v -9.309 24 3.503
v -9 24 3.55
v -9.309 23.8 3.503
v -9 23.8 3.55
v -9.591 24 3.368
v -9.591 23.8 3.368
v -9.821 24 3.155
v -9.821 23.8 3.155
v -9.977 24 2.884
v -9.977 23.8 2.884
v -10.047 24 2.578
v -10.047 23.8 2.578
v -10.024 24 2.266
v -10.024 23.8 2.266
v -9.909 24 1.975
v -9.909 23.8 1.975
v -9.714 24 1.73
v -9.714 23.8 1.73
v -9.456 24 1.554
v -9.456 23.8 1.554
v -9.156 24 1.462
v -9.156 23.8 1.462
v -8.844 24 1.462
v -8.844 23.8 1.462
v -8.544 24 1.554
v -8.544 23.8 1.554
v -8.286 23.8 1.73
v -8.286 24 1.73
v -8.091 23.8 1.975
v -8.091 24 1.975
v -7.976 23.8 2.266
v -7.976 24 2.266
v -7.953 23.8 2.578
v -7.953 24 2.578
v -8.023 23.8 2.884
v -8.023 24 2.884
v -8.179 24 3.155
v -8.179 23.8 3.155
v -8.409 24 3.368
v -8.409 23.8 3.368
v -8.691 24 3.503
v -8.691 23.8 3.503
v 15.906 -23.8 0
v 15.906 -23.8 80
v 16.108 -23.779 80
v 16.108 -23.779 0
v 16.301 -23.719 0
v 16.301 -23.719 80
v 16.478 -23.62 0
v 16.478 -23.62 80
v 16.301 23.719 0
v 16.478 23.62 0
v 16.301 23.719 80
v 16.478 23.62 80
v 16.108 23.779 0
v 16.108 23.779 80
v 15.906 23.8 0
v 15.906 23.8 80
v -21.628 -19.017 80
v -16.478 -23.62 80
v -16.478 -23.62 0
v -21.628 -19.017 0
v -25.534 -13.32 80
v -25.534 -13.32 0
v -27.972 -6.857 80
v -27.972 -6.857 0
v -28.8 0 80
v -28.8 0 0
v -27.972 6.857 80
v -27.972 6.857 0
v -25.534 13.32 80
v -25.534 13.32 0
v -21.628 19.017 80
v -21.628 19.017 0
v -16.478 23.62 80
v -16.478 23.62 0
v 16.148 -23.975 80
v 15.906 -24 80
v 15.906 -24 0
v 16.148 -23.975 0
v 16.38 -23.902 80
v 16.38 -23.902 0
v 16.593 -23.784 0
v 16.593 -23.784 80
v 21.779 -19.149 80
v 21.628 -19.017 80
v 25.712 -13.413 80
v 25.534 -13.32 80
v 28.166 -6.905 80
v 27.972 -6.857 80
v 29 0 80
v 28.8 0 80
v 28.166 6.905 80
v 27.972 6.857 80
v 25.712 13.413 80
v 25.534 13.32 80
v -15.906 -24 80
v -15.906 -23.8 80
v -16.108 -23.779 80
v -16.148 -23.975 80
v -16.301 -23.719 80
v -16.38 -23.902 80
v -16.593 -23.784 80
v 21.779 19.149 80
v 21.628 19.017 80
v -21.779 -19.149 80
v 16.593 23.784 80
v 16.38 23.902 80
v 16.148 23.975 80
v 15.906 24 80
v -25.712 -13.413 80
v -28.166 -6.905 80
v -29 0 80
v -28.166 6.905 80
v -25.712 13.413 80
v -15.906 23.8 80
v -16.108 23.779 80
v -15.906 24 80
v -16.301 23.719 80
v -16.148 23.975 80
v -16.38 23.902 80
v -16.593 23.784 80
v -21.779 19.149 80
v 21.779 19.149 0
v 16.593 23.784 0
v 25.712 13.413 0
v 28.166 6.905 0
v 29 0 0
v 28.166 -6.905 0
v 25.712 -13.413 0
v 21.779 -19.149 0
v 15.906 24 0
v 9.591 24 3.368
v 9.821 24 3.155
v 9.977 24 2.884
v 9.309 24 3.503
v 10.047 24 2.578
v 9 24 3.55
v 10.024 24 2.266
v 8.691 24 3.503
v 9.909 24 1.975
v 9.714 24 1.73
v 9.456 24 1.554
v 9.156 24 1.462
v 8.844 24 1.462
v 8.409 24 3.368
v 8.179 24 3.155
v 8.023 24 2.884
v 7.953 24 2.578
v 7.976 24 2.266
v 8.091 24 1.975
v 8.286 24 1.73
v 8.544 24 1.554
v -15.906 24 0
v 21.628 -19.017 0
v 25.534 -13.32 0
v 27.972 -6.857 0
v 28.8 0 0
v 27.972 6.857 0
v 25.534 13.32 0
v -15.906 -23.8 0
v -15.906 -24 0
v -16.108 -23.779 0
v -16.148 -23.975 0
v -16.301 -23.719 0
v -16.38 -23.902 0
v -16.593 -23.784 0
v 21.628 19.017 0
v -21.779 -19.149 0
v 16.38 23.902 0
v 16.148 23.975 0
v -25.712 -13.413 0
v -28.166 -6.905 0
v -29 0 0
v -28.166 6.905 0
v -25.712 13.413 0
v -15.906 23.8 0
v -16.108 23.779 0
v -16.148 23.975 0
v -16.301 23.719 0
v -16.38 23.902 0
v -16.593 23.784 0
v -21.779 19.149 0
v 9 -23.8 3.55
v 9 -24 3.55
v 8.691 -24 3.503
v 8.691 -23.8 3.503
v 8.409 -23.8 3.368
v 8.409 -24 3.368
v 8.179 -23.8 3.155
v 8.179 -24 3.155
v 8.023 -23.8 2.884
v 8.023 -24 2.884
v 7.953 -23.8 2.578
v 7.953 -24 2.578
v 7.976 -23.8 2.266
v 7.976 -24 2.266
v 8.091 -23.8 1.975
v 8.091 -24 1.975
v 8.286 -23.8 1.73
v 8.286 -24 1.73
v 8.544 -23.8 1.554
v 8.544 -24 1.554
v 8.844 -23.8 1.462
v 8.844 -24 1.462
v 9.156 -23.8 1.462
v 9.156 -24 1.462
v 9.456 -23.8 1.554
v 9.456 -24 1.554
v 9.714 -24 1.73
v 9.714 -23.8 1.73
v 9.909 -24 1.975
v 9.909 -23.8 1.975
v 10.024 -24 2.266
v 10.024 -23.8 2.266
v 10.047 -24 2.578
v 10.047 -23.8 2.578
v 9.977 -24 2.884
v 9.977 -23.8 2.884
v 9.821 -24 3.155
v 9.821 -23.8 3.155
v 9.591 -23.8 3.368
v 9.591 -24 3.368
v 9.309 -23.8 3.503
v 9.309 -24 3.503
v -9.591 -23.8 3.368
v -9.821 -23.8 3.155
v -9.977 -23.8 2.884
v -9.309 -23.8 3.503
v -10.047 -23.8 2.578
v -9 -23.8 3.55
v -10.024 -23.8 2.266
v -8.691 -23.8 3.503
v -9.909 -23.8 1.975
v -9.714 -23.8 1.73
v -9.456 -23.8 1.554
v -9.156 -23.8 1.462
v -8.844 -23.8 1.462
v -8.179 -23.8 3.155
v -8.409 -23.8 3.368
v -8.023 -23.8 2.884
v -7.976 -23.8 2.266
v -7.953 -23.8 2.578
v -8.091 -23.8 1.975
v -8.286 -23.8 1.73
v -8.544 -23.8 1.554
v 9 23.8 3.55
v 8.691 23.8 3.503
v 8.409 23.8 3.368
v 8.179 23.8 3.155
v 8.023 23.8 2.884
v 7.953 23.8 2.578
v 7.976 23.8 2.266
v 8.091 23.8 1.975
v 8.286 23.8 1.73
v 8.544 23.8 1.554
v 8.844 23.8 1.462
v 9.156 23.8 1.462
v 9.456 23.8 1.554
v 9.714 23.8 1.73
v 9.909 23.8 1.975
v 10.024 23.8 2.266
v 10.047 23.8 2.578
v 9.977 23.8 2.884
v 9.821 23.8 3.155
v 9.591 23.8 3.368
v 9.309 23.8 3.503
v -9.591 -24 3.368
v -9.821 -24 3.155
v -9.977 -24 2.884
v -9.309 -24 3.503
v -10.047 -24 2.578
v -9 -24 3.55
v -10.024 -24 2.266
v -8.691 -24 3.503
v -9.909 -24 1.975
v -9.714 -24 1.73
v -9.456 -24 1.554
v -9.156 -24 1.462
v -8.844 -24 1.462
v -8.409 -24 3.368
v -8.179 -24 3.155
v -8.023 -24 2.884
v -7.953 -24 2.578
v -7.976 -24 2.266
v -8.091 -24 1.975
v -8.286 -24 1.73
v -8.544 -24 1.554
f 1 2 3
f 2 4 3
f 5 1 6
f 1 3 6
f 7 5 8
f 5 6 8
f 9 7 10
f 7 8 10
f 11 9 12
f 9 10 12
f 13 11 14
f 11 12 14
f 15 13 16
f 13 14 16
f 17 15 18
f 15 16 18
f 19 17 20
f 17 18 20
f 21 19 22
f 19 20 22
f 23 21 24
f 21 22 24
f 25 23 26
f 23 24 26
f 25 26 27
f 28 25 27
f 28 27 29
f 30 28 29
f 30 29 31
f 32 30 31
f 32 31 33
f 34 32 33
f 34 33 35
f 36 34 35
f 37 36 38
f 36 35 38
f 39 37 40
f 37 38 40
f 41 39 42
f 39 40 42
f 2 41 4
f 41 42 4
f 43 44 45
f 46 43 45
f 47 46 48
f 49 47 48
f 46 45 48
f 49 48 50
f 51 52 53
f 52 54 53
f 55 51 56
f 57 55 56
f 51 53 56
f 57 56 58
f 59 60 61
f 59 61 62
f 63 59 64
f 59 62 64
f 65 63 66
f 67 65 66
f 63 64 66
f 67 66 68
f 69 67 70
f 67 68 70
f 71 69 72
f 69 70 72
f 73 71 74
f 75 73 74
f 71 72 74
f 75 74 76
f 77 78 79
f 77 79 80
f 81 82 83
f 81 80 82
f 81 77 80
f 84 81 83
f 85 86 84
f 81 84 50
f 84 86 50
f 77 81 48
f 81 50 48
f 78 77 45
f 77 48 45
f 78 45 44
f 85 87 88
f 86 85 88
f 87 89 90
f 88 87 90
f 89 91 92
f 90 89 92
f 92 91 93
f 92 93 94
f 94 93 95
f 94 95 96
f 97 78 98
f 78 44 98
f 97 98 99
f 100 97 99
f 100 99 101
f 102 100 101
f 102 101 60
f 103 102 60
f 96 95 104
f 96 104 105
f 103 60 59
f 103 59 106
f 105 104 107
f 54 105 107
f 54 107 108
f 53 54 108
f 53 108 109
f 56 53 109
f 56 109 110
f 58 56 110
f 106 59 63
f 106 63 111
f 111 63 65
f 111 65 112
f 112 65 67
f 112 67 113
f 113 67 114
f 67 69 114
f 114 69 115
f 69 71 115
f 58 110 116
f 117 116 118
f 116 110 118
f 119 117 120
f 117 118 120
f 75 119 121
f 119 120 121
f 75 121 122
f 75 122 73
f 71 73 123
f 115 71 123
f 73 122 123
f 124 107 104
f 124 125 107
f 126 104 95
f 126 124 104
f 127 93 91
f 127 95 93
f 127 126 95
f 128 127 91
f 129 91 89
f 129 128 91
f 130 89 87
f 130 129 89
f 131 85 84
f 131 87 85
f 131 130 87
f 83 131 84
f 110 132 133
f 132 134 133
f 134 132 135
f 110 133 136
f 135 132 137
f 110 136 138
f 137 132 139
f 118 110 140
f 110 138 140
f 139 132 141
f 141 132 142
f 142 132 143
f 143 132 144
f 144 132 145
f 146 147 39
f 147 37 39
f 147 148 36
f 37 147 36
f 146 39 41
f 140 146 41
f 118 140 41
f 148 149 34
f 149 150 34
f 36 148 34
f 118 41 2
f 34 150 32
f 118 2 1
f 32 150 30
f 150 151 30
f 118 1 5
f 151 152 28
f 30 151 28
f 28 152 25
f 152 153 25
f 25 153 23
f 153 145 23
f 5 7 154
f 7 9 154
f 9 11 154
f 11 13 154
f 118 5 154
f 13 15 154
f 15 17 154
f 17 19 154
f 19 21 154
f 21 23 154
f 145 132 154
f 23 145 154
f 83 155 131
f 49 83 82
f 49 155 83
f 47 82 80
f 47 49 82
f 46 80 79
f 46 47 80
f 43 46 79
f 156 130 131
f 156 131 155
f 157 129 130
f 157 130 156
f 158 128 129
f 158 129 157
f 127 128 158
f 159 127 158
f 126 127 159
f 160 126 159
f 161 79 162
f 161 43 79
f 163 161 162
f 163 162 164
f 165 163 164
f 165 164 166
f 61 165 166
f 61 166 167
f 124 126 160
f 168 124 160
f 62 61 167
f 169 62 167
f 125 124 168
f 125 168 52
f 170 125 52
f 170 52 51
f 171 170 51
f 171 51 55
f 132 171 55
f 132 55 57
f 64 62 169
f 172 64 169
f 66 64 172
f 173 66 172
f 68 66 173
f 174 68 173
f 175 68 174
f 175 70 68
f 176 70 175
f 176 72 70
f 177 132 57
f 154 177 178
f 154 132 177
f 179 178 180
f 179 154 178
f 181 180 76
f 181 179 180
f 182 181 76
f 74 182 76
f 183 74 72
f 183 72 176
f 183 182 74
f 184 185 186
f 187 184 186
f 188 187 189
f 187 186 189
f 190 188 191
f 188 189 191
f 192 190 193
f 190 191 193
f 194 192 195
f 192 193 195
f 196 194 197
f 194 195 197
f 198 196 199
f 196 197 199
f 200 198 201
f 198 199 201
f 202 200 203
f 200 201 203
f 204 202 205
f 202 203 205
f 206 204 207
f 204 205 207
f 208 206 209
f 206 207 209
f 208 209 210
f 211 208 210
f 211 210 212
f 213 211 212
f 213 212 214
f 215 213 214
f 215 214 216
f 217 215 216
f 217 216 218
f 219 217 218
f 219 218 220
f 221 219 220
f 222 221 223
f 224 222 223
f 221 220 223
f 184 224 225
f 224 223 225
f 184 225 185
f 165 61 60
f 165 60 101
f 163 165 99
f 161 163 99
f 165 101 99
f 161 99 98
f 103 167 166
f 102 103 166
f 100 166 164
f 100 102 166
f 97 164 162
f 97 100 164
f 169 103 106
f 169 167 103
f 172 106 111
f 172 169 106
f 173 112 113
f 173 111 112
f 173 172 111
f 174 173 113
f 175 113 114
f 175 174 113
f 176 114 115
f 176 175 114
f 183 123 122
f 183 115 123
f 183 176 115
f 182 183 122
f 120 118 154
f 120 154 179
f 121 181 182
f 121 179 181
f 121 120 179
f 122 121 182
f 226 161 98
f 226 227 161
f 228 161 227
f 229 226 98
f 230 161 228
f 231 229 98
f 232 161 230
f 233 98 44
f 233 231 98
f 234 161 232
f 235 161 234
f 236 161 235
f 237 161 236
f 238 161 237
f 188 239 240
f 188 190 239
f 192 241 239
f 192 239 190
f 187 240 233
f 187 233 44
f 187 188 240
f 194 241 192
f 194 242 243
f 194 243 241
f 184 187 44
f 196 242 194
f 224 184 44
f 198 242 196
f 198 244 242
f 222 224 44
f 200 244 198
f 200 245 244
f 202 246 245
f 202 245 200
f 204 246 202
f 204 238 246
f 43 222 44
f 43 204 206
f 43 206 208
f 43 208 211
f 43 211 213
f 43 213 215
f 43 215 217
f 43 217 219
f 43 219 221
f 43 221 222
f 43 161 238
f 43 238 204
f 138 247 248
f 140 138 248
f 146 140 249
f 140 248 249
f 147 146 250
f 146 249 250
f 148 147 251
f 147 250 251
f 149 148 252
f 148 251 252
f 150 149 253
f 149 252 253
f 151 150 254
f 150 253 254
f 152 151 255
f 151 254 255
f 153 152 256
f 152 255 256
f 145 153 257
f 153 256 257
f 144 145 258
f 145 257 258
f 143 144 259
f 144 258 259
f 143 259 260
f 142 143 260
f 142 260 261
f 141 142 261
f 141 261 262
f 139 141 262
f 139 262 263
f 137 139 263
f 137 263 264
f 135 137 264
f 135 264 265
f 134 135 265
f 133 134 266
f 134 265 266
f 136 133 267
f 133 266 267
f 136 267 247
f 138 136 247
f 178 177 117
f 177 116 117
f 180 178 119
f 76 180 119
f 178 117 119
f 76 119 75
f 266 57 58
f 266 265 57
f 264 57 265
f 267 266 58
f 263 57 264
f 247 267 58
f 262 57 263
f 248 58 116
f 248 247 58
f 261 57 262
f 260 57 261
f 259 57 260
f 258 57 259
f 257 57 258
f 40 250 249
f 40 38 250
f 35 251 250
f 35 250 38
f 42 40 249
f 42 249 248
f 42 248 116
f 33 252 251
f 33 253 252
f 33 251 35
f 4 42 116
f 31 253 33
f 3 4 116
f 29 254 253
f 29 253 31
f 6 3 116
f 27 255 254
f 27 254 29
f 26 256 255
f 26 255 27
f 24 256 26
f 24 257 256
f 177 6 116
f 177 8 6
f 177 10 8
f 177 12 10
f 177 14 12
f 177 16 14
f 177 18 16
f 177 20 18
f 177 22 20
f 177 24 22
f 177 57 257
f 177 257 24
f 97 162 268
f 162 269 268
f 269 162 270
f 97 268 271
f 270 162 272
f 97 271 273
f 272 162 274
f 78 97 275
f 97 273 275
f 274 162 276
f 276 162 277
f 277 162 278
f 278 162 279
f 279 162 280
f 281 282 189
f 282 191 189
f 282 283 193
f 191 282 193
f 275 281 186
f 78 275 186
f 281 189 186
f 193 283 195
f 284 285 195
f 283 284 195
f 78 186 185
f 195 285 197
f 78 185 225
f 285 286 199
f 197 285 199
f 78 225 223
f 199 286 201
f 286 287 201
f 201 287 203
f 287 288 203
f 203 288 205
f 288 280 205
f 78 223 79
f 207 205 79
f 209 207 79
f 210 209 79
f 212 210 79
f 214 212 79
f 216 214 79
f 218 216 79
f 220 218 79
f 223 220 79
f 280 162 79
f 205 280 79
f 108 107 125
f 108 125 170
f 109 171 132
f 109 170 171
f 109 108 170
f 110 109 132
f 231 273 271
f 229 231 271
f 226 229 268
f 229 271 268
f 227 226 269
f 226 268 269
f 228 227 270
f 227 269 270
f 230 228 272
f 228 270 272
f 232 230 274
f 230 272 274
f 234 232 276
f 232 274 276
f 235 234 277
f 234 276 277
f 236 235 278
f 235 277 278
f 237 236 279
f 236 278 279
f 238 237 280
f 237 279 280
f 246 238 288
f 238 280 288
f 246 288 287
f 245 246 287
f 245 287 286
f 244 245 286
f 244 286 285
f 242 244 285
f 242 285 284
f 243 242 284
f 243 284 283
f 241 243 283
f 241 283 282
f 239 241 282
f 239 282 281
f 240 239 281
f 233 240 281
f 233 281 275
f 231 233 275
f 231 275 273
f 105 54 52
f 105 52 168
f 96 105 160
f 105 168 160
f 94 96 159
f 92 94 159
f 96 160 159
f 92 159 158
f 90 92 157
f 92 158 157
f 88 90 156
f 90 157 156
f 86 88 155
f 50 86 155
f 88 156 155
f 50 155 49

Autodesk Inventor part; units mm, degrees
ref_plane "YZ Plane" through (0, 0, 0) normal (1, 0, 0) x (0, 1, 0)
ref_plane "XZ Plane" through (0, 0, 0) normal (0, 1, 0) x (-1, 0, 0)
ref_plane "XY Plane" through (0, 0, 0) normal (0, 0, 1) x (1, 0, 0)
sketch "Sketch1" plane through (0, 0, 0) normal (0, 0, 1) x (1, 0, 0)
  circle A0 centre (0, 0) radius 28.8
  line L0 (-50, 23.8) -> (50, 23.8)
  line L1 (50, 23.8) -> (50, -23.8)
  line L2 (50, -23.8) -> (-50, -23.8)
  line L3 (-50, -23.8) -> (-50, 23.8)
  point P0 (50, 0)
  point P1 (0, 23.8)
  point P2 (-16.217275, -23.8)
  point P3 (16.217275, -23.8)
  point P4 (16.217275, 23.8)
  point P5 (-16.217275, 23.8)
  dimension "d0" = 57.6
  dimension "d1" = 47.6
  dimension "d2" = 100
sketch "Sketch1 outline for Extrusion1" plane through (0, 0, 0) normal (0, 0, 1) x (1, 0, 0)
  line L0 (-16.217275, -23.8) -> (16.217275, -23.8)
  arc A0 (-16.217275, 23.8) -> (-16.217275, -23.8) centre (0, 0) ccw
  line L1 (16.217275, 23.8) -> (-16.217275, 23.8)
  arc A1 (16.217275, -23.8) -> (16.217275, 23.8) centre (0, 0) ccw
extrude "Extrusion1" add sketch "Sketch1 outline for Extrusion1" along normal blind 80
fillet "Fillet1" radius 1 4 edges at (-16.2173, 23.8, 40) (16.2173, 23.8, 40) (16.2173, -23.8, 40) (-16.2173, -23.8, 40)
thicken "Thicken1" operation add thickness 0.2 both sides no extend neighbours no toward (0, 1, 0) faces at (5.301991, 23.8, 26.666667) (-16.040924, 23.790852, 26.666667) (-27.332956, -9.074665, 53.333333) (16.237959, 23.743284, 26.666667) (28.430873, 4.596242, 53.333333) (16.362219, -23.689854, 26.666667) (-5.301991, -23.8, 26.666667) (-16.362219, -23.689854, 26.666667)
shell "Shell1" thickness 0.2 removed faces 2 at (-5.301991, -8, 80) at (-5.301991, -8, 0)
sketch "Sketch2" plane through (-19.580613, 24, 0) normal (0, 1, 0) x (1, 0, 0)
  line L0 (10.580613, -2.5) -> (28.580613, -2.5) construction
  line L1 (35.486587, 0) -> (3.674639, 0)
  point P0 (19.580613, 0)
  point P1 (31.432467, 0)
  point P2 (0, 0)
  point P3 (19.580613, -2.5)
  point P4 (19.580613, 0)
  point P5 (27.757828, 0)
  point P6 (19.580613, 0)
  dimension "d9" = 18
  dimension "d10" = 2.5
hole "Hole1" at (-9, 24, 2.5) at (9, 24, 2.5) direction (0, -1, 0) diameter 2.1 end through all
equation "\"d0\" = phi + 2 * slack"
equation "\"d1\" = flat_width + 2 * slack"
equation "\"flat_width\" = 44"
equation "\"phi\" = 54"
equation "\"slack\" = 1.8"
properties part number "probe-side-large-mesh" material "Stainless Steel"
